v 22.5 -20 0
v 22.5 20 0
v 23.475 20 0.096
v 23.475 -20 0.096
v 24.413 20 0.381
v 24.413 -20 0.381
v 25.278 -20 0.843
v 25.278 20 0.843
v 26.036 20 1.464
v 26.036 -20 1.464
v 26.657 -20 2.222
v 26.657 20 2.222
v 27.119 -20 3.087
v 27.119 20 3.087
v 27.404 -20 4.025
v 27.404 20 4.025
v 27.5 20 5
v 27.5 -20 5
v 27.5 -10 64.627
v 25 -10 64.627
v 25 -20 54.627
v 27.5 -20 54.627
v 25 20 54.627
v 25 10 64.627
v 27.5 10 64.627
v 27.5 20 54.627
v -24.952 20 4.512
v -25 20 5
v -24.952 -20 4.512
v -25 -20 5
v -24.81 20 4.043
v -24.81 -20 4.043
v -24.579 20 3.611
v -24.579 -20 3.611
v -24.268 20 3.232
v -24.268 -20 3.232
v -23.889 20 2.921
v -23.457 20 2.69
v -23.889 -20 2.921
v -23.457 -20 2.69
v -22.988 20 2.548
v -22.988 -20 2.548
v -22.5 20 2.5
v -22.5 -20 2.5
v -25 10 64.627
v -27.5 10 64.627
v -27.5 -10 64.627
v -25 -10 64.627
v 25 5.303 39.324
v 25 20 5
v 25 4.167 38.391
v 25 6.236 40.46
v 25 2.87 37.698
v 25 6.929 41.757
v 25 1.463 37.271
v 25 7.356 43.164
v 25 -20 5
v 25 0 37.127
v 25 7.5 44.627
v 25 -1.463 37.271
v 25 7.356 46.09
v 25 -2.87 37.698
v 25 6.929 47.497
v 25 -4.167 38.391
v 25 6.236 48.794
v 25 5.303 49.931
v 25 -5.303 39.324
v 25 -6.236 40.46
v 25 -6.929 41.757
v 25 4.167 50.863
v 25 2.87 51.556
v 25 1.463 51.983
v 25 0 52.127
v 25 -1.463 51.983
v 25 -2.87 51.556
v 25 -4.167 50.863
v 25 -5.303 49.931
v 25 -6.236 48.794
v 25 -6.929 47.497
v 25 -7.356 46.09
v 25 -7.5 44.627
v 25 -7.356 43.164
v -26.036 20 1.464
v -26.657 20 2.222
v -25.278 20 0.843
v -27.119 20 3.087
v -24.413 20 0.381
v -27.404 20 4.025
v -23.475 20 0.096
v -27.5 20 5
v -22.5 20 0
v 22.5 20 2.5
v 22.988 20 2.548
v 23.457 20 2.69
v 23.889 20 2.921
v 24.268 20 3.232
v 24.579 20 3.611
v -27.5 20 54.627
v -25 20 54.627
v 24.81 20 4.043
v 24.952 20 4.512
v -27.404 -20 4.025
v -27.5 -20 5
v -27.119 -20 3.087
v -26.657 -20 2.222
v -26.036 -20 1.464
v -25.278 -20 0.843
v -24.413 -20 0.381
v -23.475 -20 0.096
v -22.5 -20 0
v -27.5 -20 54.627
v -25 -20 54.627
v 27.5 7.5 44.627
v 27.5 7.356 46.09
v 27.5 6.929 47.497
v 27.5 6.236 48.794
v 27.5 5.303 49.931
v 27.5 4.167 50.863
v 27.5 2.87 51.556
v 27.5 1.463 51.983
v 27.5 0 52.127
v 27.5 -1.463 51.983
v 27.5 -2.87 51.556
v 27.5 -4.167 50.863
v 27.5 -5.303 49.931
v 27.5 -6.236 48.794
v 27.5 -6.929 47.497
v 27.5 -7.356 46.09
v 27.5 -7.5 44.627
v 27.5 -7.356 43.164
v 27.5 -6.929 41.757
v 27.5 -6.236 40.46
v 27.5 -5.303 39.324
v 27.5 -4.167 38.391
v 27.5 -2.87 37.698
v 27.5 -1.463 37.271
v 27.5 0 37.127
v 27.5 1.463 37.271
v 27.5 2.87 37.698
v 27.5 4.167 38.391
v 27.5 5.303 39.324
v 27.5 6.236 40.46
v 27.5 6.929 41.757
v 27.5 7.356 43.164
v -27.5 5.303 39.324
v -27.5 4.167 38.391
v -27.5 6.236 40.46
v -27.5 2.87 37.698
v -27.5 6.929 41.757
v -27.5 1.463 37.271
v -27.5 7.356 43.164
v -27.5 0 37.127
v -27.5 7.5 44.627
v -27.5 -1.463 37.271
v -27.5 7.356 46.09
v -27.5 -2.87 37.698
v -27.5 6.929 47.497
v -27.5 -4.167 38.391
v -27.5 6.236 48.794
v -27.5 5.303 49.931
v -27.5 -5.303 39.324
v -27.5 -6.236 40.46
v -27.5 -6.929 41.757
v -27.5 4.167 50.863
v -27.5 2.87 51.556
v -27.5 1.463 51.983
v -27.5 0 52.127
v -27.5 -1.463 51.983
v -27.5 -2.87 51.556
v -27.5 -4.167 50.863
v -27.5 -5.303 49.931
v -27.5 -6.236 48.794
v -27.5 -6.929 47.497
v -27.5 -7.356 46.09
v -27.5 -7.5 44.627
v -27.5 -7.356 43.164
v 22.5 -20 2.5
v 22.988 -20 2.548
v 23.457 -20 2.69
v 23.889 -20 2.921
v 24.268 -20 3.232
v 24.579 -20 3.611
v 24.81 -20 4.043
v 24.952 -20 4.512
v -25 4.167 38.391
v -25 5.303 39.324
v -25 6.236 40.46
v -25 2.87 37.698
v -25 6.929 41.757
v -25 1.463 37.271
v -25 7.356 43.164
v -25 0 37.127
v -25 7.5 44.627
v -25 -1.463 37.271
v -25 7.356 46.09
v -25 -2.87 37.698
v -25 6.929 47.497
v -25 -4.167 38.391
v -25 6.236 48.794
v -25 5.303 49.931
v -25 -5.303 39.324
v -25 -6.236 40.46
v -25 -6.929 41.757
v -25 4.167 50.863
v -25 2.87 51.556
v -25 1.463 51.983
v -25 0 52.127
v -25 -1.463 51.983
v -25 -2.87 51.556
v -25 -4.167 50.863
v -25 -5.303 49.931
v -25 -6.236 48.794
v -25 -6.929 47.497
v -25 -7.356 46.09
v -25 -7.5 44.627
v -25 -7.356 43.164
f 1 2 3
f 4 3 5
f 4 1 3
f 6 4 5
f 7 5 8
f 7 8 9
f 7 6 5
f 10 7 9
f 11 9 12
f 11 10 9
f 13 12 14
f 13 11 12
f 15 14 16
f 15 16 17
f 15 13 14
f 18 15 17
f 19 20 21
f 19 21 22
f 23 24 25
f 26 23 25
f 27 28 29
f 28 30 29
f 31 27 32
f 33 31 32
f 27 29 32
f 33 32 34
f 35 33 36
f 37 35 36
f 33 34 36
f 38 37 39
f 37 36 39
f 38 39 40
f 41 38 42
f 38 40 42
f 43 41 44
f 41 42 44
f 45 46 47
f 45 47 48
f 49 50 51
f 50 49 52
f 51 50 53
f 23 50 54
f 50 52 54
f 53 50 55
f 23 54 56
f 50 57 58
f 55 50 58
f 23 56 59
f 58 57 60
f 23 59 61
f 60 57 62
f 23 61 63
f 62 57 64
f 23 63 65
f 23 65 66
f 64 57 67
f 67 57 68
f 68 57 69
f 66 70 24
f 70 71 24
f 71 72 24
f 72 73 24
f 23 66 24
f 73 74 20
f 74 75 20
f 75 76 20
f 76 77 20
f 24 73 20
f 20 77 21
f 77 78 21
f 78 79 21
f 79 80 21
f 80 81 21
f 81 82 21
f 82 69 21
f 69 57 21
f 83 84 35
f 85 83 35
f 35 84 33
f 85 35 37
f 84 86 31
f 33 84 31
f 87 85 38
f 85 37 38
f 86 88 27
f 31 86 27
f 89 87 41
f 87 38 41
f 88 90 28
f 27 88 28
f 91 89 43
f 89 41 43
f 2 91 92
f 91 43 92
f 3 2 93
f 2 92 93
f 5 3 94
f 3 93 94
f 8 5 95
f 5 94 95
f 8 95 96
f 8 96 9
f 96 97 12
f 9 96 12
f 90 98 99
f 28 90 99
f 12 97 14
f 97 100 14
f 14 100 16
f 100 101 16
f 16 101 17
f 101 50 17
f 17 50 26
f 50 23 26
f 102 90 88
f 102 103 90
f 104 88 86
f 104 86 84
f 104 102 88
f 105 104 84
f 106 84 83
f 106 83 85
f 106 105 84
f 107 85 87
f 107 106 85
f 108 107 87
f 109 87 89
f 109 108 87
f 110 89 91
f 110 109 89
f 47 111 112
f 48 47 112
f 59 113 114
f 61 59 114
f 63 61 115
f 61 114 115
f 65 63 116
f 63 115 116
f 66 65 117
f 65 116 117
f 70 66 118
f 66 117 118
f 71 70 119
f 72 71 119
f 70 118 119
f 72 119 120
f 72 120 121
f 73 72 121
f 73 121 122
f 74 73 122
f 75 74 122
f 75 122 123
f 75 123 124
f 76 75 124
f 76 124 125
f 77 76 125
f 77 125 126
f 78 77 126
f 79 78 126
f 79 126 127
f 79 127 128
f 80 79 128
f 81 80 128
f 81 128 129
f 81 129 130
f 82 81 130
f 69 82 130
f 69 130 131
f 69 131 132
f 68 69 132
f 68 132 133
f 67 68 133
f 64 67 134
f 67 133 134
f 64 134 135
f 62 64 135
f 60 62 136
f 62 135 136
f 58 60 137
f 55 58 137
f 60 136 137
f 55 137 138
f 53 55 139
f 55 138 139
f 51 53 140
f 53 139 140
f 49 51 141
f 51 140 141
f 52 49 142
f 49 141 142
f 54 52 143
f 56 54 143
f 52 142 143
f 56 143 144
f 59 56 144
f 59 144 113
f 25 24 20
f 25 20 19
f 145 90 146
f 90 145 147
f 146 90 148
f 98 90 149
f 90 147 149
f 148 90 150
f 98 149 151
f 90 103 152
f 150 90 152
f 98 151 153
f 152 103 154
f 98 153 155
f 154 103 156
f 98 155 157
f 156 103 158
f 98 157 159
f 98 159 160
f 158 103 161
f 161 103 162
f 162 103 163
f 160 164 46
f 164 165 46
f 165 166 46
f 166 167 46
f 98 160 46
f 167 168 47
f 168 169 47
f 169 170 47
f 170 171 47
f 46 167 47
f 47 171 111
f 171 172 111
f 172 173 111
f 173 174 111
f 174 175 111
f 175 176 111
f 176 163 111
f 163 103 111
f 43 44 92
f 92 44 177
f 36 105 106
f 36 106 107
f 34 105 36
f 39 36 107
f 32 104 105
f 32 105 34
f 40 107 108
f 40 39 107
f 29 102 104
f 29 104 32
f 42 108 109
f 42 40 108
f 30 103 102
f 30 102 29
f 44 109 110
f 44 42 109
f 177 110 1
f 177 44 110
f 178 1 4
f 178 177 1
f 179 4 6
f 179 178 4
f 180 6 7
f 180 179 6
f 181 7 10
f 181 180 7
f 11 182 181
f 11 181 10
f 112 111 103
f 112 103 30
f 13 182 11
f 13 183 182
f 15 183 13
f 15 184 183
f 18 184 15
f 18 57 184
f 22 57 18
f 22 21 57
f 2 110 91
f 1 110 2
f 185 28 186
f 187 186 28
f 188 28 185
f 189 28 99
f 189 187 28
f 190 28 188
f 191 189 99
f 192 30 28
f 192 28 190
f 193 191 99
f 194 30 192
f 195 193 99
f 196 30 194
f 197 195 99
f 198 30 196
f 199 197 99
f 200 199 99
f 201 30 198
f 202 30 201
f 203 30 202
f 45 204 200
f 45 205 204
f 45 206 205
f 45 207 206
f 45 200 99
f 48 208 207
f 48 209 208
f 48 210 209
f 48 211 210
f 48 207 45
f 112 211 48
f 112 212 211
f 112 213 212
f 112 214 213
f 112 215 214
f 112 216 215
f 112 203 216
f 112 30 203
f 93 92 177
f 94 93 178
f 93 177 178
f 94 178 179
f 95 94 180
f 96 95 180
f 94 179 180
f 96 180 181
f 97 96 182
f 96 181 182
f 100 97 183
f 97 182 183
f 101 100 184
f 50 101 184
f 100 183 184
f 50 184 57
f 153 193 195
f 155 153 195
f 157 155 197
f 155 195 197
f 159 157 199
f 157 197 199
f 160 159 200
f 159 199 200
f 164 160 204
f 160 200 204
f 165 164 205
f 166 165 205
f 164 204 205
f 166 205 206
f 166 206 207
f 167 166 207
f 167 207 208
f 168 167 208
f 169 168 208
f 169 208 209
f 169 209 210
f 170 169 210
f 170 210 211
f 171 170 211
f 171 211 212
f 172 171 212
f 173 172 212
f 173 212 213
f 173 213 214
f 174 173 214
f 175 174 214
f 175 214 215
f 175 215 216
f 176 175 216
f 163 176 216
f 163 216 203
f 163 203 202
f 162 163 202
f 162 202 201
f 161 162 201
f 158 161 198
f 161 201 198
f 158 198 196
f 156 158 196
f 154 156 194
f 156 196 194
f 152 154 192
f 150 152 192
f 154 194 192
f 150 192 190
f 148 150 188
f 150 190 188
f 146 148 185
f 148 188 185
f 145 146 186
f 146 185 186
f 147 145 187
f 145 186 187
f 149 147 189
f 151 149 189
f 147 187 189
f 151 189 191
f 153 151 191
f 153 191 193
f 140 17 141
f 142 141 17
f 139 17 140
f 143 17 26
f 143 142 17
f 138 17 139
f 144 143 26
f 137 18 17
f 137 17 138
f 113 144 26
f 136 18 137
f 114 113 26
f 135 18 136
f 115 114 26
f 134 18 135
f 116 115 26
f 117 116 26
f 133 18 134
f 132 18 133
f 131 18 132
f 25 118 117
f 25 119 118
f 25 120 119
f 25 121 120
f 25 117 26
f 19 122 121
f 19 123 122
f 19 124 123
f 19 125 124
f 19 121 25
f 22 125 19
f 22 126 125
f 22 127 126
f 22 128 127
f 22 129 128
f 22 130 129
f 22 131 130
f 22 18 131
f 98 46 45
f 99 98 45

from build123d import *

# Parameters (mm, degrees)
F0_W          = 55
F0_H          = 64.6272003651
F1_DEPTH      = 20
F1_DEPTH_BACK = 20
F2_SIZE       = 10
F3_R          = 5
F4_T          = -2.5
F6_D          = 15


with BuildPart() as f1:
    # F0 (on Front) → F1 (new body, two sides)
    with BuildSketch(Plane.XZ) as f1_sk:
        with Locations((0, 32.3136001825)):
            Rectangle(F0_W, F0_H)
    extrude(amount=F1_DEPTH)
    extrude(f1_sk.sketch, amount=-F1_DEPTH_BACK)

    # F2
    f2_edges = [f1.edges().sort_by_distance(p)[0] for p in [
        (0, -20, 64.6272),
        (0, 20, 64.6272),
    ]]
    chamfer(f2_edges, length=F2_SIZE)

    # F3
    f3_edges = [f1.edges().sort_by_distance(p)[0] for p in [
        (-27.5, 0, 0),
        (27.5, 0, 0),
    ]]
    fillet(f3_edges, radius=F3_R)

    # F4
    f4_openings = [f1.faces().sort_by_distance(p)[0] for p in [
        (0, -20, 27.407493),
        (0, -15, 59.6272),
        (0, 0, 64.6272),
        (0, 15, 59.6272),
        (0, 20, 27.407493),
    ]]
    offset(amount=F4_T, openings=f4_openings)

    # F6 (through all)
    with Locations(Plane(origin=(-27.5, 0, 0), x_dir=(0, -1, 0), z_dir=(-1, 0, 0))):
        with Locations((0, 44.6272003651)):
            Hole(F6_D / 2)


solid = f1.part
